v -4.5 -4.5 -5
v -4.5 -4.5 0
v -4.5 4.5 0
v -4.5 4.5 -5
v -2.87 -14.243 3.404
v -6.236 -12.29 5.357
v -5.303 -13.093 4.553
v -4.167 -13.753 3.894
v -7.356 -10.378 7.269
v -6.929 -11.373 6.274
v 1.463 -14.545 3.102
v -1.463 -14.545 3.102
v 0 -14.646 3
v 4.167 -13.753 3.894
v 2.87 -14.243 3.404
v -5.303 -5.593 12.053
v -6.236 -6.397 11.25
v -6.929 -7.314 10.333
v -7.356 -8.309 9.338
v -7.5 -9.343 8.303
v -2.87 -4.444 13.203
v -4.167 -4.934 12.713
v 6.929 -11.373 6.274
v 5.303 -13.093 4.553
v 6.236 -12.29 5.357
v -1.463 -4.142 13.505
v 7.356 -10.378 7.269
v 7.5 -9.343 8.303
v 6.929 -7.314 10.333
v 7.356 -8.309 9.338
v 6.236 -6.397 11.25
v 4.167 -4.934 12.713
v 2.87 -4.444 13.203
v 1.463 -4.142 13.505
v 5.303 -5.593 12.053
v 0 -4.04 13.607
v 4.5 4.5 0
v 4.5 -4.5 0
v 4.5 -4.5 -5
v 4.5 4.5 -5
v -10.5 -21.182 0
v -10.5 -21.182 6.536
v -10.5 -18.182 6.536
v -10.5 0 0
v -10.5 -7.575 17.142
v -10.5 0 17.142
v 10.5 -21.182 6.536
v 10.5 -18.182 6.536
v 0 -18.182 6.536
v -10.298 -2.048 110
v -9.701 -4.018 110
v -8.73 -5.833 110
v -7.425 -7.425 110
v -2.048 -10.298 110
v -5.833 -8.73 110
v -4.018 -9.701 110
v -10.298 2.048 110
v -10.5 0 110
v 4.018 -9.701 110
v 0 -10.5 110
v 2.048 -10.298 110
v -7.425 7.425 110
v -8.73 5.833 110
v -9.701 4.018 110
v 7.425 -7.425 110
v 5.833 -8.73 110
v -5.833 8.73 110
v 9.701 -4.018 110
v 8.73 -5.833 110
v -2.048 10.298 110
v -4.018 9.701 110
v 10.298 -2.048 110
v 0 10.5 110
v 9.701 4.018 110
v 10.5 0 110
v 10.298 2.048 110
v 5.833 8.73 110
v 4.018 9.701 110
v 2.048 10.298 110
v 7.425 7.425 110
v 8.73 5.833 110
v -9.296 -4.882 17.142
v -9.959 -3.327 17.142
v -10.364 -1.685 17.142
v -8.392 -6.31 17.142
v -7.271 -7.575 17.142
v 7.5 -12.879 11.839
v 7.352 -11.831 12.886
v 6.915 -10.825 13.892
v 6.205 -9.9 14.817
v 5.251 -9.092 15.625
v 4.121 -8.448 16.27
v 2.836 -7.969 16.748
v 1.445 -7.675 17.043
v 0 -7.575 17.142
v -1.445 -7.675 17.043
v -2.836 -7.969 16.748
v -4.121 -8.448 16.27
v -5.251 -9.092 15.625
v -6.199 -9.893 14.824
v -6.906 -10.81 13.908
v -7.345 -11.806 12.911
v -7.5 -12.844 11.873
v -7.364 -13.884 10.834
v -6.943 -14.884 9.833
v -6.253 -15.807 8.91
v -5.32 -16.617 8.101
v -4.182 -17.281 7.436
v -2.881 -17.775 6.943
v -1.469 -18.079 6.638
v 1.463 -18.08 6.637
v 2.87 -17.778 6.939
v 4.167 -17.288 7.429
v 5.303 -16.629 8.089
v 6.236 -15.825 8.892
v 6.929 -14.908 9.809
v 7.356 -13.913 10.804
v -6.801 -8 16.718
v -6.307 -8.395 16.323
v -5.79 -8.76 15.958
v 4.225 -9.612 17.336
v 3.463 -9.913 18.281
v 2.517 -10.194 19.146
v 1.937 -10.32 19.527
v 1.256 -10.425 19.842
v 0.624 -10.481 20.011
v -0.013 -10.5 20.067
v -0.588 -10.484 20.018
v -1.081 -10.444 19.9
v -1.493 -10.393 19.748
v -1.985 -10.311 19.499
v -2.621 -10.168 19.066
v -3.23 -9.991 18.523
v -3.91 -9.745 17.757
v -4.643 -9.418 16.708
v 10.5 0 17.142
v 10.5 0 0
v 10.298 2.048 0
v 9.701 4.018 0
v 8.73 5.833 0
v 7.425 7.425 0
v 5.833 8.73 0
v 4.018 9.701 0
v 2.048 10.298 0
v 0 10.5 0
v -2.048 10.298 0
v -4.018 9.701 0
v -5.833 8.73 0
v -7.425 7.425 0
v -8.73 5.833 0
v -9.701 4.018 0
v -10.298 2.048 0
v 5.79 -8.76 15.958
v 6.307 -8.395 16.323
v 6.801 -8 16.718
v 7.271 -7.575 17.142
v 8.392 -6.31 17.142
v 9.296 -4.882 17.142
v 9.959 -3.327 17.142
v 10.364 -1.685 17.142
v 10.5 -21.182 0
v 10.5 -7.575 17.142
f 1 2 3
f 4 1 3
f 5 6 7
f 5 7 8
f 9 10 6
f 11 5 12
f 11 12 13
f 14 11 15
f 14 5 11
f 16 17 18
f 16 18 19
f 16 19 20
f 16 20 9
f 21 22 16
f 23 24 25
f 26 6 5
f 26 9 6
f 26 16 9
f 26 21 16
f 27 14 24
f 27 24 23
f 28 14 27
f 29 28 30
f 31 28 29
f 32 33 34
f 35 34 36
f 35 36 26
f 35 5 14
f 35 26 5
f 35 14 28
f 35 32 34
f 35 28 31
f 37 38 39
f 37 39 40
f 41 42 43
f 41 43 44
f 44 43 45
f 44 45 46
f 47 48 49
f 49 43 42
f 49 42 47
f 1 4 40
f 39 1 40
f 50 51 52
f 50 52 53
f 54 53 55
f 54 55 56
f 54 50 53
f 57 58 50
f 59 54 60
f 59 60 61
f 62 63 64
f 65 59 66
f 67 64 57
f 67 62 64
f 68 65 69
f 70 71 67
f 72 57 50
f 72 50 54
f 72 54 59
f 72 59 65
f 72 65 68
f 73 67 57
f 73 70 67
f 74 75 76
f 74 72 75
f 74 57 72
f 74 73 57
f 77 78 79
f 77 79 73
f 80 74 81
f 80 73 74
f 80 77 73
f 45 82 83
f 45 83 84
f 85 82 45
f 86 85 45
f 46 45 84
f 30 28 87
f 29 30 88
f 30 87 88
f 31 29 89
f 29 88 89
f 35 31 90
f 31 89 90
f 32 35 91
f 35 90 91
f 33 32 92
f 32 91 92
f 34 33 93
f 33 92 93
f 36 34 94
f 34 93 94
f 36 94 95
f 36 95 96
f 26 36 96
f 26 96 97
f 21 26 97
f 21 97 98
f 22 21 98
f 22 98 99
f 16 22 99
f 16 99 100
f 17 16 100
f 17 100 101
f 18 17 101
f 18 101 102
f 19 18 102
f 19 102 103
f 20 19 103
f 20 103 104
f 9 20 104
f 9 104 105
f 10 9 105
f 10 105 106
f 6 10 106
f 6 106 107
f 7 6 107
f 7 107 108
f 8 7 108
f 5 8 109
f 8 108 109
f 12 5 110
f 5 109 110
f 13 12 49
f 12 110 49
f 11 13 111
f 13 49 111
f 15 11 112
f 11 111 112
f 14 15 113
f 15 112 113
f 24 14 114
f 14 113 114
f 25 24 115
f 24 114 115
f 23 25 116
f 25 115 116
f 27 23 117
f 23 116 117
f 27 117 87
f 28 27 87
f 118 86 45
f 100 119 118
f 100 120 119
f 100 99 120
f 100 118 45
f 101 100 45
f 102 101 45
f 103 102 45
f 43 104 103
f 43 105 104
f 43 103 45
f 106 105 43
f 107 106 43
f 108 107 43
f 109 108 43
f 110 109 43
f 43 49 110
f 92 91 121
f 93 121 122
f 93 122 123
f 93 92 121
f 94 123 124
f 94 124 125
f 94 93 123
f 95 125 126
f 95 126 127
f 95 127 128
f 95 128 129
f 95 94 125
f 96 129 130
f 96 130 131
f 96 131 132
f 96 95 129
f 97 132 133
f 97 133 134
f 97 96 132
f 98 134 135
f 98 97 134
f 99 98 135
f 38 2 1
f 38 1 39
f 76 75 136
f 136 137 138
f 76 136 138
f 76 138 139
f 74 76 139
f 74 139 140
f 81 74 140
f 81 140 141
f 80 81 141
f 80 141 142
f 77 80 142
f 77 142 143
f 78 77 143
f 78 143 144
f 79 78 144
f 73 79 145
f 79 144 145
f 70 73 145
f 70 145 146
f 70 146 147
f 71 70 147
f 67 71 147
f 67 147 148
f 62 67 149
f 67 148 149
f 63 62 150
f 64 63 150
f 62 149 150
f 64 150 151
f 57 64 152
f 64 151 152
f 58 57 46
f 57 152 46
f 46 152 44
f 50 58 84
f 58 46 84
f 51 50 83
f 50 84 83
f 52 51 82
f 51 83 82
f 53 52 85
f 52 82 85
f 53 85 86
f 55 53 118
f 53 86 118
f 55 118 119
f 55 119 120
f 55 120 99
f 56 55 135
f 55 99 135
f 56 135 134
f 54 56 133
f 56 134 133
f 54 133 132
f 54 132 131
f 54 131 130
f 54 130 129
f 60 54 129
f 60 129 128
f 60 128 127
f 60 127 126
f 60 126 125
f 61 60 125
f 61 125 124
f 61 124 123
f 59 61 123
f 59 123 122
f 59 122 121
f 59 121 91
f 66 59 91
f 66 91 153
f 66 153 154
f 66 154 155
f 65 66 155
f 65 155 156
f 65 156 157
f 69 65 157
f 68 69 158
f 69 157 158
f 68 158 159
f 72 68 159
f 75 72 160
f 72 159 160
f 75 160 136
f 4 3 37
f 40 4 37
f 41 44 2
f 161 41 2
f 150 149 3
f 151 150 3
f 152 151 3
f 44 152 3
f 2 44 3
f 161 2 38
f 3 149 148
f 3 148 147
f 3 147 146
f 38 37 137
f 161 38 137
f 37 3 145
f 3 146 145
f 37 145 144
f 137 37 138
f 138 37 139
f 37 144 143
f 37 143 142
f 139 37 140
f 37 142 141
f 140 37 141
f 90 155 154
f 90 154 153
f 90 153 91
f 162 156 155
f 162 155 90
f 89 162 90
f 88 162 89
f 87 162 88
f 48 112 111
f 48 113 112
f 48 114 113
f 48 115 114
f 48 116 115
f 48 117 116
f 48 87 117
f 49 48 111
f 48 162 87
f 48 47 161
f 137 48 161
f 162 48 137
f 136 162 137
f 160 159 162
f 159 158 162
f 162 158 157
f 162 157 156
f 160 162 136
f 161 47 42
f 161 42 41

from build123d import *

# Parameters (mm, degrees)
F0_R          = 10.5
F1_DEPTH      = 110
F2_W          = 9
F2_H          = 9
F3_DEPTH      = 5
F6_DEPTH      = 10.5
F6_DEPTH_BACK = 10.5
F7_R          = 7.5
F8_DEPTH      = 5
F8_DEPTH_BACK = 25


with BuildPart() as f1:
    # F0 (on Top) → F1 (new body)
    with BuildSketch(Plane.XY):
        Circle(F0_R)
    extrude(amount=F1_DEPTH)

    # F2 (on Top) → F3 (join)
    with BuildSketch(Plane.XY):
        Rectangle(F2_W, F2_H)
    extrude(amount=-F3_DEPTH)

    # F4 (on Right) → F6 (join, two sides)
    with BuildSketch(Plane.YZ) as f6_sk:
        Polygon((-12.8786796564, 0), (0, 0), (0, 17.1421356237), (-4.0398448916, 17.1421356237), (-7.5753787975, 17.1421356237), (-12.8786796564, 11.8388347648), (-18.1819805153, 6.5355339059), (-21.1819805153, 6.5355339059), (-21.1819805153, 0), align=None)
    extrude(amount=F6_DEPTH)
    extrude(f6_sk.sketch, amount=-F6_DEPTH_BACK)

    # F7 (on face) → F8 (cut, two sides)
    with BuildSketch(Plane(origin=(0, -12.3587572106, 12.3587572106), x_dir=(1, 0, 0), z_dir=(0, -0.7071067812, 0.7071067812))) as f8_sk:
        with Locations((0, -0.7352813742)):
            Circle(F7_R)
    extrude(amount=-F8_DEPTH, mode=Mode.SUBTRACT)
    extrude(f8_sk.sketch, amount=F8_DEPTH_BACK, mode=Mode.SUBTRACT)


solid = f1.part
